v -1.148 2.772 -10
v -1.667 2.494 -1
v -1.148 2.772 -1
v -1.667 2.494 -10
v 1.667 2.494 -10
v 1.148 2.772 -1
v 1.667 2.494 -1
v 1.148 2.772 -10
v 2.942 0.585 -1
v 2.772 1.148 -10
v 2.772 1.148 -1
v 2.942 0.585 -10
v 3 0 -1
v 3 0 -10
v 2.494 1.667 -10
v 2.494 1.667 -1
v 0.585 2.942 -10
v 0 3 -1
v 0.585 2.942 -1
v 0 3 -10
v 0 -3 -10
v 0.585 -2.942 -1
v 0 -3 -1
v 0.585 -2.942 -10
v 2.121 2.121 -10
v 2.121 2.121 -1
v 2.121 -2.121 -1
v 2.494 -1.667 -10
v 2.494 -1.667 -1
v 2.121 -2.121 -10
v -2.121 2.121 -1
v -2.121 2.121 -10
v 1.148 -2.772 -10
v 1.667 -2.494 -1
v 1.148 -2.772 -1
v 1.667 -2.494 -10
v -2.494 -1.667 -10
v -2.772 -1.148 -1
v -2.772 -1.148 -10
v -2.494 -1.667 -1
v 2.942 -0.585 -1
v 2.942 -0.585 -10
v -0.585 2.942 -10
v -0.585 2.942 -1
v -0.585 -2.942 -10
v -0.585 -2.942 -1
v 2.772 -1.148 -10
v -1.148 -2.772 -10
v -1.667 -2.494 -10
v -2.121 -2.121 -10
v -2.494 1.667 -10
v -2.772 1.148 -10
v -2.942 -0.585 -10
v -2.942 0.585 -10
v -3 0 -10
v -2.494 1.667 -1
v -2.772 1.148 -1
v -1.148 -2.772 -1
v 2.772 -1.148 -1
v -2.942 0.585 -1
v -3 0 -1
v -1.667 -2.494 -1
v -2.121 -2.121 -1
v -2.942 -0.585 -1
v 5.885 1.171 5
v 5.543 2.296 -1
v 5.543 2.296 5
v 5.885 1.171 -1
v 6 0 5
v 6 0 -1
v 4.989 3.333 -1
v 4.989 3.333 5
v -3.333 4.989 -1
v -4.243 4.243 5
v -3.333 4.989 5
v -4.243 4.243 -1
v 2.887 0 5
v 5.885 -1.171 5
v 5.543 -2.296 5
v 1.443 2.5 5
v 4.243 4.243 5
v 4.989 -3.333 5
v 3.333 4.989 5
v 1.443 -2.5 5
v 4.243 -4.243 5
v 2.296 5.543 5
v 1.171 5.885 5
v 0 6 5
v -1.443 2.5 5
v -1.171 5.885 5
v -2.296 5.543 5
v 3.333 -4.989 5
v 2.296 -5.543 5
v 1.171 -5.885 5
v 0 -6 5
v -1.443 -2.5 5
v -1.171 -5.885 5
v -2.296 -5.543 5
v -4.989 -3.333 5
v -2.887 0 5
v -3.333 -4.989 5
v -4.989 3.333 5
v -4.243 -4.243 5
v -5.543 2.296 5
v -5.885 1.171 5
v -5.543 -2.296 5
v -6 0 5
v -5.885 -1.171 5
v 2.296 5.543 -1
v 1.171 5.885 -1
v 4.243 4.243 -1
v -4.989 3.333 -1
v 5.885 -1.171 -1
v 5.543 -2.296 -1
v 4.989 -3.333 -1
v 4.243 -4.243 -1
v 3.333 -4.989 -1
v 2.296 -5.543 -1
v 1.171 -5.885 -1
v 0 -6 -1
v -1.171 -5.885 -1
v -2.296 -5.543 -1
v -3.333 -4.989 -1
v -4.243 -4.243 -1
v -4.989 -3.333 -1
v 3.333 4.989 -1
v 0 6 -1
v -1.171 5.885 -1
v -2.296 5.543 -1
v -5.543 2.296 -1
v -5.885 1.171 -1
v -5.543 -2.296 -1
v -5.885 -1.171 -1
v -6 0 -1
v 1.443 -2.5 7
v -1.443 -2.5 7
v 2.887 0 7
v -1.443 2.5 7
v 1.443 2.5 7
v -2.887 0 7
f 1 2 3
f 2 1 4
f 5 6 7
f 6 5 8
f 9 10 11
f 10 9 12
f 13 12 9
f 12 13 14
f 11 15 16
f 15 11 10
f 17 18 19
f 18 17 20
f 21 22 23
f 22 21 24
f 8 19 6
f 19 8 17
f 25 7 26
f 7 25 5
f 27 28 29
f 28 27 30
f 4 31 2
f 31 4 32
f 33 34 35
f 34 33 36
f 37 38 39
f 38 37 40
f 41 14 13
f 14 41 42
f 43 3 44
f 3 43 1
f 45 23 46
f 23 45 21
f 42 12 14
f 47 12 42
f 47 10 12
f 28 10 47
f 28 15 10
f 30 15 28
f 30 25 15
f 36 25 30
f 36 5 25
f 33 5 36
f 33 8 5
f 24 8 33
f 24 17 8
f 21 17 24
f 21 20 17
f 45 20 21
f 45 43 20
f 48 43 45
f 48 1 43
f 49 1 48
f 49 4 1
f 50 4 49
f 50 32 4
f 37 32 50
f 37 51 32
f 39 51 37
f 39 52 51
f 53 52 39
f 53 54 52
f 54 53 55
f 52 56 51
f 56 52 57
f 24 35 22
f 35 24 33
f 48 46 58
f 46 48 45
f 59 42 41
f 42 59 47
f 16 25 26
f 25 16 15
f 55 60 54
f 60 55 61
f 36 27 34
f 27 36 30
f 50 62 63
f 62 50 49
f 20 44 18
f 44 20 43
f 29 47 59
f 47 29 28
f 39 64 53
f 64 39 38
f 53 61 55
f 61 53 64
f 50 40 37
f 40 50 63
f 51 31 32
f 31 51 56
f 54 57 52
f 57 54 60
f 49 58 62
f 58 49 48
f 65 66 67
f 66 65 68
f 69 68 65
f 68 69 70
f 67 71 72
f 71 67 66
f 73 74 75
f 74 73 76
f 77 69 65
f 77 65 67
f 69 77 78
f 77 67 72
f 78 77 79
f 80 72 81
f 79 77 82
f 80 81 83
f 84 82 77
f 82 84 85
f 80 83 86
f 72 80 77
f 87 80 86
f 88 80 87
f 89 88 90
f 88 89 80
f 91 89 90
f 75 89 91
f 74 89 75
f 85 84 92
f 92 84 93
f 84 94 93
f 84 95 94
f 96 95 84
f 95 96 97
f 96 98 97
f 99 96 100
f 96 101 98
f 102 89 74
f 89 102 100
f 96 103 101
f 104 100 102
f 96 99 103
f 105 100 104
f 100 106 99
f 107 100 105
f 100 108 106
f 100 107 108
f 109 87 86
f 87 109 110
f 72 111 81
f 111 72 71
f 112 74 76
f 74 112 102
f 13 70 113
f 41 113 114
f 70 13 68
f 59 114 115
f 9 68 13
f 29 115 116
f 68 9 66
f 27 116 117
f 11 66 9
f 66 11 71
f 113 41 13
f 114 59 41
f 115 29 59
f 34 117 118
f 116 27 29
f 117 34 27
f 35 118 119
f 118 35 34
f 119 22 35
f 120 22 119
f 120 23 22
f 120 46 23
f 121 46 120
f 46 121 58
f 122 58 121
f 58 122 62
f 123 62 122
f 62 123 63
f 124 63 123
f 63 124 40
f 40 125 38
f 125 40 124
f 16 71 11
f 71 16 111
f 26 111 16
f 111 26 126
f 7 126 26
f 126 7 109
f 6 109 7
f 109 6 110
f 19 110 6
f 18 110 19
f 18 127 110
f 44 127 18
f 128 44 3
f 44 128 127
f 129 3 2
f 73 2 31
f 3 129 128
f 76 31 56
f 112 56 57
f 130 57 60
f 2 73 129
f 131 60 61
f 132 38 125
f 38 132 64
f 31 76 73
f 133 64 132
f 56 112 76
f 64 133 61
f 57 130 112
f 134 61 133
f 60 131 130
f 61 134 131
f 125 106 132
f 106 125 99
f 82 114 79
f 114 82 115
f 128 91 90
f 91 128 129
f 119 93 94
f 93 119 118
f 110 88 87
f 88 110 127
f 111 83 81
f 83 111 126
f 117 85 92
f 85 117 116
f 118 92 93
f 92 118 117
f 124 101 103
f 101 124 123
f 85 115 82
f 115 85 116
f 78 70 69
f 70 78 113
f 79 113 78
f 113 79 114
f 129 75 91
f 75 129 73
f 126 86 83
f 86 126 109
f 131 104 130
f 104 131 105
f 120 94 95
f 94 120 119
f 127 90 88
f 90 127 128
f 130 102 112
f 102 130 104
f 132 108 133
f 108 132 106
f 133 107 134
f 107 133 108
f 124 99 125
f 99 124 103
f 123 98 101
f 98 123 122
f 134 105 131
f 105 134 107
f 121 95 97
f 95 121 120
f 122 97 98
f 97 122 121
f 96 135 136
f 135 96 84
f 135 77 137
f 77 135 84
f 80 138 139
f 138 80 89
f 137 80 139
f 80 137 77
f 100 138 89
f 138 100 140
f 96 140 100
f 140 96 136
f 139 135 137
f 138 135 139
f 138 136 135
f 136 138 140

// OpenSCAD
// Parameters
shank_diameter = 6; //[3:12:0.1]
head_diameter = 12; //[6:24:0.1]
length = 10; //[5:20:0.1]
head_height = 6; //[3:12:0.1]
socket_af = 5; //[2.5:10:0.1]
socket_depth = 4; //[2:8:0.1]
thread_length = 10; //[5:20:0.1]
thread_minor_diameter = 5.2; //[2.6:10.4:0.1]
washer_outer_diameter = 12; //[6:24:0.1]
washer_thickness = 1.5; //[0.8:3:0.1]
washer_hole_diameter = 6.5; //[3.5:13:0.1]
overlap = 1; //[0.5:2:0.1]

// Screw and Washer - complete geometry
module screw_and_washer() {
  color("DimGray") {
    // Screw Body with Thread
    union() {
      translate([0, 0, -length/2])
        cylinder(h=length, r=shank_diameter/2, center=true, $fn=32);
      translate([0, 0, -thread_length/2])
        cylinder(h=thread_length, r=thread_minor_diameter/2, center=true, $fn=32);
    }
    
    // Cylindrical Head
    translate([0, 0, head_height/2 - overlap])
      cylinder(h=head_height, r=head_diameter/2, center=true, $fn=32);
    
    // Hex Socket Recess
    difference() {
      translate([0, 0, head_height - socket_depth/2])
        cylinder(h=socket_depth + 2*overlap, r=socket_af/(2*cos(30)), center=true, $fn=6);
    }
  }
  
  // Washer
  color("Silver") {
    difference() {
      translate([0, 0, -washer_thickness/2 + overlap])
        cylinder(h=washer_thickness, r=washer_outer_diameter/2, center=true, $fn=32);
      translate([0, 0, -washer_thickness/2 + overlap])
        cylinder(h=washer_thickness + 2*overlap, r=washer_hole_diameter/2, center=true, $fn=32);
    }
  }
}

// Assembly
module assembly() {
  screw_and_washer();
}

assembly();
